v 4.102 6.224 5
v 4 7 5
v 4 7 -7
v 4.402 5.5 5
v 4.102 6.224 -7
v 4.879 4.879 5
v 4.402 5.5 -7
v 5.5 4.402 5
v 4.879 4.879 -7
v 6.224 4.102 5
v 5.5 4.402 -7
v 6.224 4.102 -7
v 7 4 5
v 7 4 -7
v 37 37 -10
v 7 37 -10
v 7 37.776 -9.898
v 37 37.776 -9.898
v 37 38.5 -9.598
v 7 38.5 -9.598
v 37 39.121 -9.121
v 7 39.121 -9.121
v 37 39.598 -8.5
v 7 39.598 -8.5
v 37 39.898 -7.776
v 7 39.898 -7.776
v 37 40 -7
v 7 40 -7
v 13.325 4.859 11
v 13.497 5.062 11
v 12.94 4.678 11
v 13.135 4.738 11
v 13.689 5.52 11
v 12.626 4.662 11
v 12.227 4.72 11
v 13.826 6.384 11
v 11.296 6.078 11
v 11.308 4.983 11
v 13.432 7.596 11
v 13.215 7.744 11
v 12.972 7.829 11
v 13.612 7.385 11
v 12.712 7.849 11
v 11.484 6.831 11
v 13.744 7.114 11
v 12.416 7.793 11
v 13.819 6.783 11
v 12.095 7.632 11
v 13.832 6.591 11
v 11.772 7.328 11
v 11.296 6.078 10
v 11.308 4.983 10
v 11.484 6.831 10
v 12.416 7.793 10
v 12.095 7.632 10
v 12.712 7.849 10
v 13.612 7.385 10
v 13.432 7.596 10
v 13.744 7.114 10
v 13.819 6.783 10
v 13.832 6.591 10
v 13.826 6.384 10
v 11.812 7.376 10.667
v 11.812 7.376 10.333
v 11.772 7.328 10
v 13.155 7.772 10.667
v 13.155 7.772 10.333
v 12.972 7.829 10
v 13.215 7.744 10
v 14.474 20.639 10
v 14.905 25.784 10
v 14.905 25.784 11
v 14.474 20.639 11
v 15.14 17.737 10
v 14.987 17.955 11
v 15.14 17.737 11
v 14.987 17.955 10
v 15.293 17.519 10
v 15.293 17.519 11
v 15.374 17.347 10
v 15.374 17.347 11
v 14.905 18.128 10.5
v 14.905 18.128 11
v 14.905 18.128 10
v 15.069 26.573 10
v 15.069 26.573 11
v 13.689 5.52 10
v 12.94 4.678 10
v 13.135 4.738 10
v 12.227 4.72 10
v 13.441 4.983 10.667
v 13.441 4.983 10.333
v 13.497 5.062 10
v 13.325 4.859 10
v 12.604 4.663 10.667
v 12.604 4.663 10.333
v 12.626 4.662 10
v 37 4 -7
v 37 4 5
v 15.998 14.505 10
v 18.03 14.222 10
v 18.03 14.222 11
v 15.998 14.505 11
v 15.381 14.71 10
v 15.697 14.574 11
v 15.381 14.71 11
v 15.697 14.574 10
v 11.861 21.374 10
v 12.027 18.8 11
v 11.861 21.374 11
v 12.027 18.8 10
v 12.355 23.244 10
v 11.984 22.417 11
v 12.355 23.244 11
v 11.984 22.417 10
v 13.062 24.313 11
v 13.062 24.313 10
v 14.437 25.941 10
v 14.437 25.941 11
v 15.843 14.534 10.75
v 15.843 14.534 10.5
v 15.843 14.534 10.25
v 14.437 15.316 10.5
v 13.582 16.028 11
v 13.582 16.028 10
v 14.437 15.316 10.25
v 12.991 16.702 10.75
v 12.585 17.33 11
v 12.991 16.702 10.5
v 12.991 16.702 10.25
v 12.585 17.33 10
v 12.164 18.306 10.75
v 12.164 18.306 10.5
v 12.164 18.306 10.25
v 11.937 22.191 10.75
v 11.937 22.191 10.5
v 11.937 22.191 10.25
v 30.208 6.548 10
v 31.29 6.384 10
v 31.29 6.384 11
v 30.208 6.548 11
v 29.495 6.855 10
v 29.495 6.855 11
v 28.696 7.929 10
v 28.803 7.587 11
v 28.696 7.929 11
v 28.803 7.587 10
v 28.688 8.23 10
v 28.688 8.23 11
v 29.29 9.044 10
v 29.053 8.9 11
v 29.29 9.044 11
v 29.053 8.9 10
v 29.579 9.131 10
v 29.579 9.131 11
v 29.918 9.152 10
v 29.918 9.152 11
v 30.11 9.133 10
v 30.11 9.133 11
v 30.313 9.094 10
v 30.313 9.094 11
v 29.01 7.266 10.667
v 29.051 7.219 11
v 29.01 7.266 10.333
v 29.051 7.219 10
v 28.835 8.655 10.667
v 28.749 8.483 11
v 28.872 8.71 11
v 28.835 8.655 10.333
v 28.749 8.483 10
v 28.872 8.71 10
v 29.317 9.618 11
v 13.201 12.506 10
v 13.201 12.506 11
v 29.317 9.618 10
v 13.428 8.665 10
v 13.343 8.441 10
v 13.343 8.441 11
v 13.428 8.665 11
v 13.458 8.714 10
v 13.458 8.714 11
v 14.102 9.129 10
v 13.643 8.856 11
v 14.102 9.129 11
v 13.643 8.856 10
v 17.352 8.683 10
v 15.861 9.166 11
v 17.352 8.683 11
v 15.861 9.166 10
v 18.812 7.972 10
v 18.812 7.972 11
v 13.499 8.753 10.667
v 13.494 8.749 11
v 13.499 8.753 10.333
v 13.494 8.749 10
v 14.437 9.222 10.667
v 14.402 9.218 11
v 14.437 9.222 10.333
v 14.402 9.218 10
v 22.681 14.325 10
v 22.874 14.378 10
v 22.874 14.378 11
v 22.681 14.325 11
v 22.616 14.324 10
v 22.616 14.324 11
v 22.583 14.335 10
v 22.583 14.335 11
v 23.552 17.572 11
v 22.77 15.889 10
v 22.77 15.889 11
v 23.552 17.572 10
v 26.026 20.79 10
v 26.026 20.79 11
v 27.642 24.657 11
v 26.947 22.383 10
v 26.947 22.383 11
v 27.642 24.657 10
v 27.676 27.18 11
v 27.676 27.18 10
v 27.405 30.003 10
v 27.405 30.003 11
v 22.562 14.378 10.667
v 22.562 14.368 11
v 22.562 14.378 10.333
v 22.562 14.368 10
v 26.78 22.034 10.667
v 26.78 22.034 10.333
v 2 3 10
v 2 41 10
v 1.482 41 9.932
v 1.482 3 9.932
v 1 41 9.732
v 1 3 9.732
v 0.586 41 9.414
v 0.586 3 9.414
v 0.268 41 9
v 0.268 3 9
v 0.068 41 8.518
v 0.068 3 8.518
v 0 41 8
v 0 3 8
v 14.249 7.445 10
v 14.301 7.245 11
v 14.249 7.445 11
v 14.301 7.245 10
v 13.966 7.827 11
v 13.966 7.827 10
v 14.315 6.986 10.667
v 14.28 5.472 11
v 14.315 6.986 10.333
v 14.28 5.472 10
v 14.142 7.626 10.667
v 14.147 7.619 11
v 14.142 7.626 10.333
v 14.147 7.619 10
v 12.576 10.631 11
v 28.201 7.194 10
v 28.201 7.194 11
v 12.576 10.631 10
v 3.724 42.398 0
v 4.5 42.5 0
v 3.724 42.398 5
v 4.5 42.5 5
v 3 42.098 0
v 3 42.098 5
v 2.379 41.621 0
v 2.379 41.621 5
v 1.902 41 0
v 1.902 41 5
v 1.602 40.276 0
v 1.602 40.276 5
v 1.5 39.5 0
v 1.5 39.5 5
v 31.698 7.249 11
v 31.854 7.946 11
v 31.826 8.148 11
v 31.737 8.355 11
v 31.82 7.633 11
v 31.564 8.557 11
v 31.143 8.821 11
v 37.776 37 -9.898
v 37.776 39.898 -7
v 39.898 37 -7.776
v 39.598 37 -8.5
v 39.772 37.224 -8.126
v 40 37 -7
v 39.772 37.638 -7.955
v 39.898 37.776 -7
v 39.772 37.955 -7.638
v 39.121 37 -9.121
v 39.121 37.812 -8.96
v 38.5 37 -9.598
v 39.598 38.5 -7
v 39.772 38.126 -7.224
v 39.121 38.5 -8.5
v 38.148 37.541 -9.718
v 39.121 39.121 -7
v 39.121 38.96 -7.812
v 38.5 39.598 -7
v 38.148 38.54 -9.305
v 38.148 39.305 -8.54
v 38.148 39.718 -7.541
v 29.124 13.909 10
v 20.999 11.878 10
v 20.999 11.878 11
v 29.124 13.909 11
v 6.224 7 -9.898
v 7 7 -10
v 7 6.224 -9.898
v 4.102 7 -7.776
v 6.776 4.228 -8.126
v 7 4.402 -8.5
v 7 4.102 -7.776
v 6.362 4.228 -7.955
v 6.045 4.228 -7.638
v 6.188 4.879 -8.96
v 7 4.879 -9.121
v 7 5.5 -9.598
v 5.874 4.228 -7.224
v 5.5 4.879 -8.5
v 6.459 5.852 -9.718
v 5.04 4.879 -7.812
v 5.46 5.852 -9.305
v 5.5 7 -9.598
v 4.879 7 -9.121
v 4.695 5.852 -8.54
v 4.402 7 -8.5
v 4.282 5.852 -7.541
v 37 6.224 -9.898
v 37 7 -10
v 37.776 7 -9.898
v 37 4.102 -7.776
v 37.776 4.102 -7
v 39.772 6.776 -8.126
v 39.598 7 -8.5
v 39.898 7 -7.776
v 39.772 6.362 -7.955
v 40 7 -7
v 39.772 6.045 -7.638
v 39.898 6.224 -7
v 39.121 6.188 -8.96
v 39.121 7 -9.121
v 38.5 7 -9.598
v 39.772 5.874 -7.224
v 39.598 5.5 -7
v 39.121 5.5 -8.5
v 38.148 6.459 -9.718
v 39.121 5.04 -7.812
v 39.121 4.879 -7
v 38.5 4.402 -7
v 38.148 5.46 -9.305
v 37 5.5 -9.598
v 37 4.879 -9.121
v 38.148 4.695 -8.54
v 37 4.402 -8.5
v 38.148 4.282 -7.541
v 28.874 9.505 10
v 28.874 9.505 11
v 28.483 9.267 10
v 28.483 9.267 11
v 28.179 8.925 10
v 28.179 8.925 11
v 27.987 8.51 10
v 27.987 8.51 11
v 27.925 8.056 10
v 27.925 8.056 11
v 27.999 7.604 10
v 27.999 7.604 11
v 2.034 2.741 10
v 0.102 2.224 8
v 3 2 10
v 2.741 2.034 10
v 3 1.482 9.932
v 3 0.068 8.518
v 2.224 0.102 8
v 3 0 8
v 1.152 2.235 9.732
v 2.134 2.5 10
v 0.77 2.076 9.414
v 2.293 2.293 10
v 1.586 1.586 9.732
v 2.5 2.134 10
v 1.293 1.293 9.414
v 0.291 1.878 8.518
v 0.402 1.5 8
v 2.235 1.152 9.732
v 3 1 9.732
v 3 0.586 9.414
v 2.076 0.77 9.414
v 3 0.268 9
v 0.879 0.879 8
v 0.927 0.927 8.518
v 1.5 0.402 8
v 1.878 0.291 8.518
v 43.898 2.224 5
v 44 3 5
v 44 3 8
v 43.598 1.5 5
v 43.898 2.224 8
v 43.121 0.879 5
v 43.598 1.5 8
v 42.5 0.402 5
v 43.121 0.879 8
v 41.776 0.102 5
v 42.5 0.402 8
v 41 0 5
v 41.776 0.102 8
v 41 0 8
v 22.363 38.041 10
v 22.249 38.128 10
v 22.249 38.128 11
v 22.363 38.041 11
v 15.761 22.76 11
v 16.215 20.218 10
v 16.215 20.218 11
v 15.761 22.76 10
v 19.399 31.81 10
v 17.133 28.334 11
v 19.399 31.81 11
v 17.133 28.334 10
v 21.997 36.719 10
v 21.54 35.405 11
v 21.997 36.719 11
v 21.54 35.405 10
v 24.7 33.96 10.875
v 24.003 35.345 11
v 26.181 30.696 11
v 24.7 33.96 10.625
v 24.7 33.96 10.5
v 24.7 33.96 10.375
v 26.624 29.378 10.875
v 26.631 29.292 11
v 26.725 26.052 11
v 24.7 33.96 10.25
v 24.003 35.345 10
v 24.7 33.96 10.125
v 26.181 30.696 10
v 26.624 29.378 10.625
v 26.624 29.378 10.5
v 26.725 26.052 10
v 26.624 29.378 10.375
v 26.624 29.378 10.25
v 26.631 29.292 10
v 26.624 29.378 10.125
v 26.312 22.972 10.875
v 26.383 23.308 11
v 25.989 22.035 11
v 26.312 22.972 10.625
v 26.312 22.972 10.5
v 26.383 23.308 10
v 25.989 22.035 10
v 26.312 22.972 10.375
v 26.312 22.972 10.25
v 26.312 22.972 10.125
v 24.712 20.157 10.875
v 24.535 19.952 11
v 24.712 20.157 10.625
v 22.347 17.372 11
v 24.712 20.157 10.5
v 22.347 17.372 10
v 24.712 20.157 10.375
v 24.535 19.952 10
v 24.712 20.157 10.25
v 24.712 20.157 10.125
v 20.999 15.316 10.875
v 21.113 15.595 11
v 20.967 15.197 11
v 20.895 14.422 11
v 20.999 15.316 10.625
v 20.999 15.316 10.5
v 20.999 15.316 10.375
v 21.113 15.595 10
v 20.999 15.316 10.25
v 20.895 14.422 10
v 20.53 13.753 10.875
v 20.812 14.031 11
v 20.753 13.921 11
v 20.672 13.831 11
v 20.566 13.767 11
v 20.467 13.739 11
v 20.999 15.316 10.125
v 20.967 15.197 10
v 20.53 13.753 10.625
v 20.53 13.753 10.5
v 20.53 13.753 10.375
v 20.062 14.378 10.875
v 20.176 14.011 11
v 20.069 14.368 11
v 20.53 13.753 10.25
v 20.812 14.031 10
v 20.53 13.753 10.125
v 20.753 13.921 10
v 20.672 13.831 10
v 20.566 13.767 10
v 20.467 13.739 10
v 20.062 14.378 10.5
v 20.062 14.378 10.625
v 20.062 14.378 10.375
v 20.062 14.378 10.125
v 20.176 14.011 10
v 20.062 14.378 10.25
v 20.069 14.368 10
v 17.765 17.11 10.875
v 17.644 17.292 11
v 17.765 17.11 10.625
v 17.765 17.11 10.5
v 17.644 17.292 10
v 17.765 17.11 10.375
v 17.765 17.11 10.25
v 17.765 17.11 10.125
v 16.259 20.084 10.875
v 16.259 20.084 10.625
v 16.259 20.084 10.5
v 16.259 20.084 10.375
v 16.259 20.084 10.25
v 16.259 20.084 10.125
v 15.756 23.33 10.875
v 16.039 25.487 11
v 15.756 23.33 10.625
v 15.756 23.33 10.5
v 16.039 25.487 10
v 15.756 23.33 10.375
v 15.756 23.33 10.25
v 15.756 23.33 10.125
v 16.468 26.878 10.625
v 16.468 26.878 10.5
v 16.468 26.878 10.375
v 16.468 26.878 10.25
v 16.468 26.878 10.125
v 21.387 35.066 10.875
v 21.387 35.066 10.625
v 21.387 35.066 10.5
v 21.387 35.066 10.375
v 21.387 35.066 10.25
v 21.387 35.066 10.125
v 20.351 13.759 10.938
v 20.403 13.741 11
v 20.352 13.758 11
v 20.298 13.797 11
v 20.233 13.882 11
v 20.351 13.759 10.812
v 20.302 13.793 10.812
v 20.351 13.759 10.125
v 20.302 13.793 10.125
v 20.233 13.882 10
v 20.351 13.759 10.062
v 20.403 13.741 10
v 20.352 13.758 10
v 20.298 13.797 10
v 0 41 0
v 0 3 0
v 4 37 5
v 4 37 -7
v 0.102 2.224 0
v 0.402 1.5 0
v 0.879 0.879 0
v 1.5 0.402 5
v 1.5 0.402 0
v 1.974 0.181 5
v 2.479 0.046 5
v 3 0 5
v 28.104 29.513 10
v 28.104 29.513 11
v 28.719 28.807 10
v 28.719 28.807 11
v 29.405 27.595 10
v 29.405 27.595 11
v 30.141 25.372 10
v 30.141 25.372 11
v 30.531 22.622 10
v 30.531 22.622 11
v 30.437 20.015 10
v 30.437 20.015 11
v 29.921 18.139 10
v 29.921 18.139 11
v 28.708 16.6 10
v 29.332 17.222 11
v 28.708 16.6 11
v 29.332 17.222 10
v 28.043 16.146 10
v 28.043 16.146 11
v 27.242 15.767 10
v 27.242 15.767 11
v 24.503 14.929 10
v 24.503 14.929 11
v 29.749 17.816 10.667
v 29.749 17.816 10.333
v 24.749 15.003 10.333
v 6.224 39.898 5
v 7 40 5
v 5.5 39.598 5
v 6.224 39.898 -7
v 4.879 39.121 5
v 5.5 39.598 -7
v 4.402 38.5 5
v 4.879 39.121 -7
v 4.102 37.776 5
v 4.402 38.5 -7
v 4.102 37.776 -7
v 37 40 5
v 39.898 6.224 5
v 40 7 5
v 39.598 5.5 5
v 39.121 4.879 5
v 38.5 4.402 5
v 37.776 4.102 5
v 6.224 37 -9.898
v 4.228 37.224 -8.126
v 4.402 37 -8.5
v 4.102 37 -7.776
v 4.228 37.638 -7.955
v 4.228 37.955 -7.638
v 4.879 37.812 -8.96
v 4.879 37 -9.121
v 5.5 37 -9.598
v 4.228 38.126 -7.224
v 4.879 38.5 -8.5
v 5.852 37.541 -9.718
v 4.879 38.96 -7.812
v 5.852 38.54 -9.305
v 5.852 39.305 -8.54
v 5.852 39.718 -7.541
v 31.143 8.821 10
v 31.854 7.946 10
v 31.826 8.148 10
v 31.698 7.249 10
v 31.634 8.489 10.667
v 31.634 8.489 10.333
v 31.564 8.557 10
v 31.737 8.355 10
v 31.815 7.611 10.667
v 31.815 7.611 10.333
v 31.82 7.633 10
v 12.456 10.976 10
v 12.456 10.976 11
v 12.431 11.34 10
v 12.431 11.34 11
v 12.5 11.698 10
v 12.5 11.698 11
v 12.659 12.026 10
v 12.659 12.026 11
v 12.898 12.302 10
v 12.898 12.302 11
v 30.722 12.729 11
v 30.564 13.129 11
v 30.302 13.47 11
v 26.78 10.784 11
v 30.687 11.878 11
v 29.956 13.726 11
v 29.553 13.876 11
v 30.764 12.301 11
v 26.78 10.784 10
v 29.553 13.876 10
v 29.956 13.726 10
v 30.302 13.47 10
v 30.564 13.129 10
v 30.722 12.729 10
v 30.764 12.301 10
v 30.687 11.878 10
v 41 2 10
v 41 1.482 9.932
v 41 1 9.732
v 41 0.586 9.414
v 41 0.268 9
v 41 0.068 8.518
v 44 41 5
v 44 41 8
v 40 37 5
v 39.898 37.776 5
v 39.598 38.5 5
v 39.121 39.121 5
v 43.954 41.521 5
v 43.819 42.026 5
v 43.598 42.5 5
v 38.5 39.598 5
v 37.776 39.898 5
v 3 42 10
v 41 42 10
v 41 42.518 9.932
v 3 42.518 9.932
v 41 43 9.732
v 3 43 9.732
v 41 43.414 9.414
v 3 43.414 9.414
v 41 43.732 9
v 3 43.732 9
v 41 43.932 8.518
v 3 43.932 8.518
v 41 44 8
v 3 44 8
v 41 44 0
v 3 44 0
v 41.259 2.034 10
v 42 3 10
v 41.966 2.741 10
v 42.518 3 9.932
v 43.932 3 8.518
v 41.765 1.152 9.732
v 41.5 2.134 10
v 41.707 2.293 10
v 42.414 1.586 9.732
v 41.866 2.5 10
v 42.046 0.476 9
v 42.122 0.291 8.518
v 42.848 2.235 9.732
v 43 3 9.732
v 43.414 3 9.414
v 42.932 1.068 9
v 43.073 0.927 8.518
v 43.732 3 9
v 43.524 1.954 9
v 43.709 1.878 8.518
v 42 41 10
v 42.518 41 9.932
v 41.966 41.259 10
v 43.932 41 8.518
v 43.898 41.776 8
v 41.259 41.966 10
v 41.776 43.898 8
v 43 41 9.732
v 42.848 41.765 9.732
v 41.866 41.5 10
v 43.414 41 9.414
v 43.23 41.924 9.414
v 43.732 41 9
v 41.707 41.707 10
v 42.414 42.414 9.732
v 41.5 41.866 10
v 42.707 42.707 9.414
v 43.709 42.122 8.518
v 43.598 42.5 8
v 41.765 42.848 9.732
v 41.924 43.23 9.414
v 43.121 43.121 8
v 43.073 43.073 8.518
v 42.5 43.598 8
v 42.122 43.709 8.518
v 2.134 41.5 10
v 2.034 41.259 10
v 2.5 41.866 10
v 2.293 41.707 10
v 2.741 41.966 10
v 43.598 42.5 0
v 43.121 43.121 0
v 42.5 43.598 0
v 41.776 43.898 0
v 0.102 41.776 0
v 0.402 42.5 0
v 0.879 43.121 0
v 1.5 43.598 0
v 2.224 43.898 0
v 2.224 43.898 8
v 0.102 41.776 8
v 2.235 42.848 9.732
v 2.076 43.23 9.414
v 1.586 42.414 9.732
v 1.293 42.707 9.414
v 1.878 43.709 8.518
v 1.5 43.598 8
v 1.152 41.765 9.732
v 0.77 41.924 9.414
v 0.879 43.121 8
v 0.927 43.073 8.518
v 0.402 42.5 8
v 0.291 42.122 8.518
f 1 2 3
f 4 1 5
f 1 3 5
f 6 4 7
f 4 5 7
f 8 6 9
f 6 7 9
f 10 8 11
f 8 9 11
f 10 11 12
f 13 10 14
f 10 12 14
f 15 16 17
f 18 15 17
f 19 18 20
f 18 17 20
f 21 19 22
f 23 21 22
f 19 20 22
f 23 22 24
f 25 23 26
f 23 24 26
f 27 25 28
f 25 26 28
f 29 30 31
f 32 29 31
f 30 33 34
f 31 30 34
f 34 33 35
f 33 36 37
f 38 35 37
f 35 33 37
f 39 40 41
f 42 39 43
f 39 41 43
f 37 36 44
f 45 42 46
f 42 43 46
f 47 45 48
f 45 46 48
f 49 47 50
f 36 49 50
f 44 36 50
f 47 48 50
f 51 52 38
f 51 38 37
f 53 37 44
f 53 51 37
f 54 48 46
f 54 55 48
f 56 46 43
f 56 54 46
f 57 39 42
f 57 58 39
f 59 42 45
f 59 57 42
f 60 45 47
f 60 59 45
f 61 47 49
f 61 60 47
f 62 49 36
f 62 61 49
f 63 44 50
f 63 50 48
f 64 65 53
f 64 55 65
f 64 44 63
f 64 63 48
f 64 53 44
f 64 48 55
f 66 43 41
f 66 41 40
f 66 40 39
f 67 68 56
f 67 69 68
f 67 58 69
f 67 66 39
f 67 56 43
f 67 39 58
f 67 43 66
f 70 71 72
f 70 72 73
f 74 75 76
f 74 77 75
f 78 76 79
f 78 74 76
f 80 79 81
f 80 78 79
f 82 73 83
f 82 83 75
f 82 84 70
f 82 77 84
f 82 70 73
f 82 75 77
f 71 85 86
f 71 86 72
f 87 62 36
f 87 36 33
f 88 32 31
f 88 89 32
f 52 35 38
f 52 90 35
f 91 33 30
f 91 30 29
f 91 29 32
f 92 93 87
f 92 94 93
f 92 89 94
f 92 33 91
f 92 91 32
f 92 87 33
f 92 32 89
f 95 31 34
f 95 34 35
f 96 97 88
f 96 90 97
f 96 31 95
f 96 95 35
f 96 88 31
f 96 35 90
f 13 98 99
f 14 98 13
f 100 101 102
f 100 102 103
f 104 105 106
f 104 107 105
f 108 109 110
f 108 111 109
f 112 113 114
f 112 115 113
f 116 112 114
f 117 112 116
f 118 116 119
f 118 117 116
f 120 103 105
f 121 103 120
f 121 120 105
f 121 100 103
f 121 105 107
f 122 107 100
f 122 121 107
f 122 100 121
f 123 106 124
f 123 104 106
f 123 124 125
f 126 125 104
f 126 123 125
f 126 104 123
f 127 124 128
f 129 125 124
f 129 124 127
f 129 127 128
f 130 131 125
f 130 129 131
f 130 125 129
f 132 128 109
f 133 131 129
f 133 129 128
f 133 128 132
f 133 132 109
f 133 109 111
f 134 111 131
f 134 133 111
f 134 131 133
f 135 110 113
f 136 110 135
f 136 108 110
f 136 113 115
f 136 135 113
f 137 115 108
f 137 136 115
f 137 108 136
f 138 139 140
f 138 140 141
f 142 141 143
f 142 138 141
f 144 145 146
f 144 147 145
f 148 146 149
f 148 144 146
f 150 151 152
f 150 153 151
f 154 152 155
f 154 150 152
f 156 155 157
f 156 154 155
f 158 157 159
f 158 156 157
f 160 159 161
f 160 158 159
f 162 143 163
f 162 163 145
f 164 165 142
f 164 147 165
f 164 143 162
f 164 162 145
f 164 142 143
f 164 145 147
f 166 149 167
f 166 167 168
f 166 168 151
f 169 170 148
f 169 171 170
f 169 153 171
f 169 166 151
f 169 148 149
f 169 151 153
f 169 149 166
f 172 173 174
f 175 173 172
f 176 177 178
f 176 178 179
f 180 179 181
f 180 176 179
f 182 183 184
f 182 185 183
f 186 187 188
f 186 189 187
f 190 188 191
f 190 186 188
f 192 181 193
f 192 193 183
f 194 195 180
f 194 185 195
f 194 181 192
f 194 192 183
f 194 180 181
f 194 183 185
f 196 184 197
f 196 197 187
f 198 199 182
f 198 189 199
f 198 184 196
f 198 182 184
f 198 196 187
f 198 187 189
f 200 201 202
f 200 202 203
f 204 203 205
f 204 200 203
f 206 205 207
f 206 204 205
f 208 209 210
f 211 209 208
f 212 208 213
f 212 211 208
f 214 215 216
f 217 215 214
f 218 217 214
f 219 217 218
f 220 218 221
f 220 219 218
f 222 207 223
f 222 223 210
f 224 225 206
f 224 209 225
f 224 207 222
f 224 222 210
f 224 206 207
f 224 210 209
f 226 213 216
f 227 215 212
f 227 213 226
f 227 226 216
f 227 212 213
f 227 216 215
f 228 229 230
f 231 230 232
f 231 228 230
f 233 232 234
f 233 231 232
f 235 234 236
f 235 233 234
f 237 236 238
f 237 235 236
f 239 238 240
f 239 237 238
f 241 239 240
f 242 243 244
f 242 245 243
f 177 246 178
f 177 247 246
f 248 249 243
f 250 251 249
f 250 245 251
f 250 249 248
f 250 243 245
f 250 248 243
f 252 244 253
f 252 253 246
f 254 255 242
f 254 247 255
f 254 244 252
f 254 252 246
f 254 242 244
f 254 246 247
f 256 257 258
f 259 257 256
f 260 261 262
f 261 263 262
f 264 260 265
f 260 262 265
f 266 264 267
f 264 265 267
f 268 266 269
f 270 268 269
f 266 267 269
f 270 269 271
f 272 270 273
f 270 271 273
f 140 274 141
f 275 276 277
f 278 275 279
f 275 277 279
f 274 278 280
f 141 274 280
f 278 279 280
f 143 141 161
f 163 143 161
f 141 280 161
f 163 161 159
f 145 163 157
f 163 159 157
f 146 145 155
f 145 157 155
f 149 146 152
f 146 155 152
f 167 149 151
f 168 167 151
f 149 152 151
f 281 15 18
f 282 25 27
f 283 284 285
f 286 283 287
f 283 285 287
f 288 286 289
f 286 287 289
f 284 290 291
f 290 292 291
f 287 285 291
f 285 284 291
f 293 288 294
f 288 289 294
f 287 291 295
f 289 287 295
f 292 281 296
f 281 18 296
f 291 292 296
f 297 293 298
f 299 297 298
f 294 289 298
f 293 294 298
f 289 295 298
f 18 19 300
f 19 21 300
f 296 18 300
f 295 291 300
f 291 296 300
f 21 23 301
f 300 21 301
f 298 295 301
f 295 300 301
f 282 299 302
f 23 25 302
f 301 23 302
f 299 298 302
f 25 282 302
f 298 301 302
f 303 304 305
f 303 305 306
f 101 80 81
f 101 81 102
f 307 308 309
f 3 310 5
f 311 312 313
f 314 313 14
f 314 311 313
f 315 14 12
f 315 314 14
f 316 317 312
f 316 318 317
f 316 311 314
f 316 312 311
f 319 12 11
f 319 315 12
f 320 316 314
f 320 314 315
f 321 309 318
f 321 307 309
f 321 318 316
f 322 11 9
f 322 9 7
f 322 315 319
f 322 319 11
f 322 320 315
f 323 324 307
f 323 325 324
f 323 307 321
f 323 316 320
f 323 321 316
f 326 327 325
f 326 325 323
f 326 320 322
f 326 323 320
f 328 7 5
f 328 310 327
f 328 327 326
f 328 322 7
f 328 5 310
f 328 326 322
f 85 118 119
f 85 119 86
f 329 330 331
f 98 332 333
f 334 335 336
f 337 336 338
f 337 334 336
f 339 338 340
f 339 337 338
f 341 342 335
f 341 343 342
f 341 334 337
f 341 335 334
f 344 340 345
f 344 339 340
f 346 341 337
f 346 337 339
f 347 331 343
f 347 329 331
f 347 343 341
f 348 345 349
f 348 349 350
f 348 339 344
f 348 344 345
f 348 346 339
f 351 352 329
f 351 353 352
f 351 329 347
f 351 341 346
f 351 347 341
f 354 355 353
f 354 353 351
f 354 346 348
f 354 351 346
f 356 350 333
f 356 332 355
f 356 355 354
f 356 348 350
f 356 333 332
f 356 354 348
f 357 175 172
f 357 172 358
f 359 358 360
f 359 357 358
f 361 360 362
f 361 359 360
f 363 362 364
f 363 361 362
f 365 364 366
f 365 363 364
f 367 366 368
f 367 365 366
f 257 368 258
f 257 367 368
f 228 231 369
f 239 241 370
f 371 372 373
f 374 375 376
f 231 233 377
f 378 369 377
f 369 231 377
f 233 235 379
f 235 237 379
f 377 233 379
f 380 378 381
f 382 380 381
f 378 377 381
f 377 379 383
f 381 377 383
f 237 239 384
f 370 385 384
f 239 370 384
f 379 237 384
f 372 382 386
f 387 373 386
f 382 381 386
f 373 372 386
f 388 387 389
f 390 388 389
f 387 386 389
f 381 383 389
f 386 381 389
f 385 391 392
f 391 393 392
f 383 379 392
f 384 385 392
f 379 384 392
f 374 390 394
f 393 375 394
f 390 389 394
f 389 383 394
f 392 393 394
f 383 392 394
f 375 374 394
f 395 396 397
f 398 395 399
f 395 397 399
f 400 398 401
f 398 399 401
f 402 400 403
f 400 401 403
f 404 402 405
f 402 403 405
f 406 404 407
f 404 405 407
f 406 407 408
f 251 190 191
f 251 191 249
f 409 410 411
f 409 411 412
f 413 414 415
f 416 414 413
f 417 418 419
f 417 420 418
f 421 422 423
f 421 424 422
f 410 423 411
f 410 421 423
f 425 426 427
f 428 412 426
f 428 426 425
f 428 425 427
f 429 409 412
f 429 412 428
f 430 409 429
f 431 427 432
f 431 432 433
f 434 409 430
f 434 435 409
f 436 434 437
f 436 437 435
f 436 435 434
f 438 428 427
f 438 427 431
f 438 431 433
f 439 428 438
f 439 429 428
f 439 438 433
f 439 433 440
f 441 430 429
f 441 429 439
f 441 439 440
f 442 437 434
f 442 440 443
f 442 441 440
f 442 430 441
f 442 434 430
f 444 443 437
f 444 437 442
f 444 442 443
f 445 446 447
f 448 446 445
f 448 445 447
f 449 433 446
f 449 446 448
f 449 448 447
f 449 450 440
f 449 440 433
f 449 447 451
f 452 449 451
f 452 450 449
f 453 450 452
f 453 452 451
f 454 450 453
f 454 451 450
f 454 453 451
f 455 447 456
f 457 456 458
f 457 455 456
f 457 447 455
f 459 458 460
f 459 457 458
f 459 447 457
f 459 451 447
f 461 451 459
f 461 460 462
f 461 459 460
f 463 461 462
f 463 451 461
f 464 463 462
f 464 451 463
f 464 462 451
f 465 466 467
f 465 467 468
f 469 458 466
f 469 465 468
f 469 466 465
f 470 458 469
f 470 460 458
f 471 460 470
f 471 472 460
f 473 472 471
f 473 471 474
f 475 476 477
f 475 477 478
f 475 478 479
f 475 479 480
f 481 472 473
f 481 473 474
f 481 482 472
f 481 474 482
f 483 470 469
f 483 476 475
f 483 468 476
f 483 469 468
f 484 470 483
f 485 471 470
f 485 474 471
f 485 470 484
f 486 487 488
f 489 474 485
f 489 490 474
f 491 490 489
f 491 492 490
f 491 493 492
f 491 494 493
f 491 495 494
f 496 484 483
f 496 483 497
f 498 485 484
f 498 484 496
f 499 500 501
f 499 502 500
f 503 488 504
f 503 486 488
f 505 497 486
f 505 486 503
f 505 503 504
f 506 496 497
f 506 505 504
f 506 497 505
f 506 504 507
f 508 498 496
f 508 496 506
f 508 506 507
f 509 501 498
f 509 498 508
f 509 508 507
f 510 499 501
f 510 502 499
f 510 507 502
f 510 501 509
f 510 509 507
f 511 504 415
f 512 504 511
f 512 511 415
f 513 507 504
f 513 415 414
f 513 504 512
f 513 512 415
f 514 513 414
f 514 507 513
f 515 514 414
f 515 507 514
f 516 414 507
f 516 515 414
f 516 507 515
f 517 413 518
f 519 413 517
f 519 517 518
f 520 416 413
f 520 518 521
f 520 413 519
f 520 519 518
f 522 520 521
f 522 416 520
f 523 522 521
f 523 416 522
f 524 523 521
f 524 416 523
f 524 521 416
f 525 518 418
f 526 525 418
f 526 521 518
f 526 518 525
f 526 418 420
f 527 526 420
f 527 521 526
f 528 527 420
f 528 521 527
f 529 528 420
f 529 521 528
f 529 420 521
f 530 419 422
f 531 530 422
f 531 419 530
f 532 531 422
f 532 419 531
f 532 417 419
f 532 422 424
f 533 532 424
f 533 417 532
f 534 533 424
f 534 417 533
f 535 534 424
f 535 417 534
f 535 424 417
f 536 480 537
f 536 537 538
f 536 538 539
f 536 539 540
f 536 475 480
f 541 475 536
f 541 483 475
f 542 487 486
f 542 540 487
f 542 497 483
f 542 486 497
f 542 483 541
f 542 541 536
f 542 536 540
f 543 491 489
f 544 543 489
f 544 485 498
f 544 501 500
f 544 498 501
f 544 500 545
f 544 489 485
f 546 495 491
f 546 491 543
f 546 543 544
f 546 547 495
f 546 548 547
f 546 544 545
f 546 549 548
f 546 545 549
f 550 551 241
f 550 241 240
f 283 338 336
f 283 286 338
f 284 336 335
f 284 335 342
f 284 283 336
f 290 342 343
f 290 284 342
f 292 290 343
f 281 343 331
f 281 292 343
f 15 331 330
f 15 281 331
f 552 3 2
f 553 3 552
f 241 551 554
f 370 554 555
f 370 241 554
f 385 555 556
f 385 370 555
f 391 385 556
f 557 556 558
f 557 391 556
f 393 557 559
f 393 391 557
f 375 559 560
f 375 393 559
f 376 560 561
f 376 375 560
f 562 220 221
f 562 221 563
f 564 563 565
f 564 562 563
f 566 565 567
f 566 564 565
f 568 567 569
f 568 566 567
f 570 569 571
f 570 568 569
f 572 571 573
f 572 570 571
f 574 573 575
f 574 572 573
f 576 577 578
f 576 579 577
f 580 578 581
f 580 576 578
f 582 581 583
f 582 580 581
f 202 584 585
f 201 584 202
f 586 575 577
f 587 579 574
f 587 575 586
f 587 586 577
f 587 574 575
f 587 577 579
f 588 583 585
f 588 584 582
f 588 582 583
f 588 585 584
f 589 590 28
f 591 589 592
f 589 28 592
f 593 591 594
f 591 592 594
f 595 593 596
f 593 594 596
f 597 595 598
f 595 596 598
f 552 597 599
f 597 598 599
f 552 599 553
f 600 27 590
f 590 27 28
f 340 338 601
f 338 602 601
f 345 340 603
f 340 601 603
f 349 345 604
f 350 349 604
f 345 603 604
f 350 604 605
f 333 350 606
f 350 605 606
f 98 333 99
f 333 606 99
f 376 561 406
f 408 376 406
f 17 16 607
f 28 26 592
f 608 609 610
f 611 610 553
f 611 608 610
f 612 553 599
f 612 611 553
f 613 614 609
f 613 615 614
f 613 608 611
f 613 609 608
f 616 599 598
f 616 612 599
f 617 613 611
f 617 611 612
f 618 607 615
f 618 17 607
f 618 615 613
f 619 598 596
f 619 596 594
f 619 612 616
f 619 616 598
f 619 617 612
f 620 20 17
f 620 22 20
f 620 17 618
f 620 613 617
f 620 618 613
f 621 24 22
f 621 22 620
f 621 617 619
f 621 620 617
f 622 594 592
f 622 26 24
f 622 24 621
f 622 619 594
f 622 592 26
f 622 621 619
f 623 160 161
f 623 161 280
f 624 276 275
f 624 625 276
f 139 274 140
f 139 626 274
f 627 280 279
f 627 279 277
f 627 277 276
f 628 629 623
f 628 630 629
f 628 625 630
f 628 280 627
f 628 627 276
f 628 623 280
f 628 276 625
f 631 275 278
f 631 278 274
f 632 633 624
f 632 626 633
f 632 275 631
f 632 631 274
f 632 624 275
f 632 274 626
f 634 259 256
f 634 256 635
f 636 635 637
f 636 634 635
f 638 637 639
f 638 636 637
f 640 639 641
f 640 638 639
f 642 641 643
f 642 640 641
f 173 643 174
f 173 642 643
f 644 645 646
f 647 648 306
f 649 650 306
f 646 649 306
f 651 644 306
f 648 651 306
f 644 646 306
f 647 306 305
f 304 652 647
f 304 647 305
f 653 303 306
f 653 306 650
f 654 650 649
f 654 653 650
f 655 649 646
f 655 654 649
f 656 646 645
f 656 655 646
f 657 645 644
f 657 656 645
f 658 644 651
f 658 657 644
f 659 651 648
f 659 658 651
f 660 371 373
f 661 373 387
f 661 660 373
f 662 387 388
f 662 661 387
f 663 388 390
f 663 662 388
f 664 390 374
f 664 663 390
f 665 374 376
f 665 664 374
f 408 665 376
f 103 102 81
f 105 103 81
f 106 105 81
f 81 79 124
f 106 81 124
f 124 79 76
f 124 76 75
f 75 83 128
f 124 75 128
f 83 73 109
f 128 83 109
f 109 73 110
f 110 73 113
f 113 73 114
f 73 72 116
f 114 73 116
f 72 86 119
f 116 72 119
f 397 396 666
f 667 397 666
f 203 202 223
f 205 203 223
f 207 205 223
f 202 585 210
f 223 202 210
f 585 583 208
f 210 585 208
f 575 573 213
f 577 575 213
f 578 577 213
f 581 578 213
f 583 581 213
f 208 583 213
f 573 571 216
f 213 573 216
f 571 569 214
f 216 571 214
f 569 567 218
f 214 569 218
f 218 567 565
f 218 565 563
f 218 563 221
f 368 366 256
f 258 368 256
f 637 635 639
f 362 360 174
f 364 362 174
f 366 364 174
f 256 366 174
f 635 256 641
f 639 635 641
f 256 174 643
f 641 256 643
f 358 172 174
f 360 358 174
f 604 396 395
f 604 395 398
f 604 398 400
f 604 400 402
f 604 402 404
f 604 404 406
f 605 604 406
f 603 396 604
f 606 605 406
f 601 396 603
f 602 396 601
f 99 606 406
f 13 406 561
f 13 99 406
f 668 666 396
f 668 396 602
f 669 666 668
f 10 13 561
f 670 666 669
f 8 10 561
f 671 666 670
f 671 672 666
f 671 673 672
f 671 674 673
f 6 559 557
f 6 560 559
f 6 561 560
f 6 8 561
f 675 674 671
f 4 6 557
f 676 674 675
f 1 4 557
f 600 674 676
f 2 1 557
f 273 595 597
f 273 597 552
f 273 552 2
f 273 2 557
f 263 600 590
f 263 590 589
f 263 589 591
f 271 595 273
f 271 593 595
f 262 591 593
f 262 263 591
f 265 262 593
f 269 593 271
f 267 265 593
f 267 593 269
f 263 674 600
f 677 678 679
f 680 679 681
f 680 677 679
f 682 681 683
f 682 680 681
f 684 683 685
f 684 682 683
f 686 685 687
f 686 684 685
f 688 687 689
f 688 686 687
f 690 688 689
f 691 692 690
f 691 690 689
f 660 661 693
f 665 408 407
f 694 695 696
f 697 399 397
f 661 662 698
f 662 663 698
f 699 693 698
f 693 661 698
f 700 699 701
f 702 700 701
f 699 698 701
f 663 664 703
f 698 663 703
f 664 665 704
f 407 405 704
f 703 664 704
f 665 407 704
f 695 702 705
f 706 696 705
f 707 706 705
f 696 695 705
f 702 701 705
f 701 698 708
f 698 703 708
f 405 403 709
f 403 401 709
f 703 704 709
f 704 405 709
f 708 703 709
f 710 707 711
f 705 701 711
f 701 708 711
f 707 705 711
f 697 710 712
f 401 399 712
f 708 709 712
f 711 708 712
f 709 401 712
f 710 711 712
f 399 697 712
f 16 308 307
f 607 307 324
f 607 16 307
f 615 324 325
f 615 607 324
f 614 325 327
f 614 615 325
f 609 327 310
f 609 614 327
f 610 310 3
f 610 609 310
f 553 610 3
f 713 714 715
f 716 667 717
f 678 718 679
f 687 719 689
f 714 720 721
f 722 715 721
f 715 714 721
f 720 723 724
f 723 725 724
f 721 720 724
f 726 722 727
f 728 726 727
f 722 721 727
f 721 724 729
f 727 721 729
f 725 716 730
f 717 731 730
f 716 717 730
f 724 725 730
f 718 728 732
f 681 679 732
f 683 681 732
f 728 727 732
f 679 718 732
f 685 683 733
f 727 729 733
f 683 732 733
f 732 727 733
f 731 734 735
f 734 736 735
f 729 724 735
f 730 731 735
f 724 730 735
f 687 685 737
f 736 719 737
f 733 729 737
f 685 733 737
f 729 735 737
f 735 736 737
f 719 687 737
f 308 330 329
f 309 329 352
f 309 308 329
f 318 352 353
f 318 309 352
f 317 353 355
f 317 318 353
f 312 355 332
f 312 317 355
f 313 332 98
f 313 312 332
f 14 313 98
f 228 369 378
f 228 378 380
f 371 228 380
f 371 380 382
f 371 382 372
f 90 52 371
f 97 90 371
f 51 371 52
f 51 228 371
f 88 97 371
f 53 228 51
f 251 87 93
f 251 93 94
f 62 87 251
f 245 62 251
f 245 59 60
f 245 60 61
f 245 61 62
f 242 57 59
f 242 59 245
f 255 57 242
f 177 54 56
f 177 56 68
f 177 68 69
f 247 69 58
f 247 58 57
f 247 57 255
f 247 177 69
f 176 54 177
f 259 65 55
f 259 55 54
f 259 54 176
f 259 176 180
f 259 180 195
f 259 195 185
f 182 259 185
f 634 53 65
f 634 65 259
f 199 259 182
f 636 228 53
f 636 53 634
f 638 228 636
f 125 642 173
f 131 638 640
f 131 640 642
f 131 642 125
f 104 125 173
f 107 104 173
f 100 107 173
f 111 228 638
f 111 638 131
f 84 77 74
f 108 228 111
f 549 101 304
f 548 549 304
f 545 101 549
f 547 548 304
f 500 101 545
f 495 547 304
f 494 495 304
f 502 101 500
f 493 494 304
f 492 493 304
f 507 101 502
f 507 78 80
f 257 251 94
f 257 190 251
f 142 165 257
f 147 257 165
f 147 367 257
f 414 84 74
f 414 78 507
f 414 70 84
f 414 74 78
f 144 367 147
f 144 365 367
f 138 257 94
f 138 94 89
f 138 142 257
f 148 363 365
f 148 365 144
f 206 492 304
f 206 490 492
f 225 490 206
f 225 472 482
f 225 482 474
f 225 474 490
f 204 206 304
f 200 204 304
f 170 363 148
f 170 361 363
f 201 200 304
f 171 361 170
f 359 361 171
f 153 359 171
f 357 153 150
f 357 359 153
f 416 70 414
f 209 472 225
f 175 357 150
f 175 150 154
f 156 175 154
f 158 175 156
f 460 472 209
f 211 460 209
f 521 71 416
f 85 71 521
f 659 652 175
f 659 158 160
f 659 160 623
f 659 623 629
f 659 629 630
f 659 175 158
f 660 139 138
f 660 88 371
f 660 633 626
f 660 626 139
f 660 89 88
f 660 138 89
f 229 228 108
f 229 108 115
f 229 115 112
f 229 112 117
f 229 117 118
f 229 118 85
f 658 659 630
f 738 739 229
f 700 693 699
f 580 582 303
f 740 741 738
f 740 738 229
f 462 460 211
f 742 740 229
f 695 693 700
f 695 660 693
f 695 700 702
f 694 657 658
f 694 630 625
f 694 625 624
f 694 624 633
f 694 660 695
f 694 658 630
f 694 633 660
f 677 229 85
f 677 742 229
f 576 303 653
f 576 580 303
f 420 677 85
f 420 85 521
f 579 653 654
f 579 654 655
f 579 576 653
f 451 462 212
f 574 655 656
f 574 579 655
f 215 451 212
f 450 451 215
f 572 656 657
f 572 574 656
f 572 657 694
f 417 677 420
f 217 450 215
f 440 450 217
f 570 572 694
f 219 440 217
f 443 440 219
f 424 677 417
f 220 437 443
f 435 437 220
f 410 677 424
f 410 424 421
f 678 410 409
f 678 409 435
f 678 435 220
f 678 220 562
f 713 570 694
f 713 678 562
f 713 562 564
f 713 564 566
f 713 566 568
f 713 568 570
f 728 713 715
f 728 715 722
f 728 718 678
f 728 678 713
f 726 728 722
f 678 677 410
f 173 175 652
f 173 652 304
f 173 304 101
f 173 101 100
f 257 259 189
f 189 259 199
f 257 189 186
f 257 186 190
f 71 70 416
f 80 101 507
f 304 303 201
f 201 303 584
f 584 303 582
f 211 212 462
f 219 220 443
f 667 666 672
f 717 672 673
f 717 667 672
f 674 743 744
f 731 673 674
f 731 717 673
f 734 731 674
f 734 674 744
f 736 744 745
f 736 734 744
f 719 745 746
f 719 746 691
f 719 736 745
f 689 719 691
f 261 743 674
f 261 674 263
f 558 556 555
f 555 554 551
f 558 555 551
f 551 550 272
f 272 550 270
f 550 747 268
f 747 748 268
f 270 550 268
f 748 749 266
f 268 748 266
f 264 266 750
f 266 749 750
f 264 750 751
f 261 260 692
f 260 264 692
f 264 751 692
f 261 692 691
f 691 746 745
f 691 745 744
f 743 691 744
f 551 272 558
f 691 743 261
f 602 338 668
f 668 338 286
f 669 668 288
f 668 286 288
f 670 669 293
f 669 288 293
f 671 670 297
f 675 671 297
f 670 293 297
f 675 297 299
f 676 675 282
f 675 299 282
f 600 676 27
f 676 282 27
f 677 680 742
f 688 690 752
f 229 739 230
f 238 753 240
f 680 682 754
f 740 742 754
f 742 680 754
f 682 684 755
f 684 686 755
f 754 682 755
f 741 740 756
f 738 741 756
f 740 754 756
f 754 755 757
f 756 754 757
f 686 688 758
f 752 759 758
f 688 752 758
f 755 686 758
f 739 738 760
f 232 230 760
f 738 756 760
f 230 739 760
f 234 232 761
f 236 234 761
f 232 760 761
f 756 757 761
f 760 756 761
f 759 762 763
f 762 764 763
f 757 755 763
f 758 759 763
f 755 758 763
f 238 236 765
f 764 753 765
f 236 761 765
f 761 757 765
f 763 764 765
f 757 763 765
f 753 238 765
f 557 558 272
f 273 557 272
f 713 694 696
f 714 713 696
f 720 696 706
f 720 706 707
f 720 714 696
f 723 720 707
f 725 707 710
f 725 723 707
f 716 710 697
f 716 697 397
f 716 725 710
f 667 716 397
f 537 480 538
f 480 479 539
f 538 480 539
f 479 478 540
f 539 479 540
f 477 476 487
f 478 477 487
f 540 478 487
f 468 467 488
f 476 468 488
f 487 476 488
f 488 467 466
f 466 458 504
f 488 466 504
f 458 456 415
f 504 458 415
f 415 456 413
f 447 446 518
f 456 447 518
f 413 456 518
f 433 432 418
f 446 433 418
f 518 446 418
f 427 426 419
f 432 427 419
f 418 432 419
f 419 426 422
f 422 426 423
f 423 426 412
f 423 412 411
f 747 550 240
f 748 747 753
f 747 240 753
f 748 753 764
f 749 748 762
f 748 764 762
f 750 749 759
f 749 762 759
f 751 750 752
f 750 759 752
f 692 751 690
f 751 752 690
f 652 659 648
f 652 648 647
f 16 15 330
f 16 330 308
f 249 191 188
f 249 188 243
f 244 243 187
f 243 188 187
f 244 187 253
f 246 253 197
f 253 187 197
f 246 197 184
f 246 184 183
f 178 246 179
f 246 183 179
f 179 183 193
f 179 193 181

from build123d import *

# Parameters (mm, degrees)
ESQUISSE2_W             = 44
ESQUISSE2_H             = 44
BOSS_EXTRU_1_DEPTH      = 10
ESQUISSE3_W             = 36
ESQUISSE3_H             = 36
BOSS_EXTRU_2_DEPTH      = 10
ESQUISSE4_W             = 42.5
ESQUISSE4_H             = 42.5
ESQUISSE4_W_2           = 36
ESQUISSE4_H_2           = 36
ENL_V_MAT_EXTRU_1_DEPTH = 5
CONG_1_R                = 3
CONG_2_R                = 2
BOSS_EXTRU_4_DEPTH      = 1


with BuildPart() as part:
    # Esquisse2 → Boss.-Extru.1 (new body)
    with BuildSketch(Plane.XY):
        with Locations((22, 22)):
            Rectangle(ESQUISSE2_W, ESQUISSE2_H)
    extrude(amount=BOSS_EXTRU_1_DEPTH)

    # Esquisse3 → Boss.-Extru.2 (add)
    with BuildSketch(Plane(origin=(0, 0, 0), x_dir=(-1, 0, 0), z_dir=(0, 0, -1))):
        with Locations((-22, 22)):
            Rectangle(ESQUISSE3_W, ESQUISSE3_H)
    extrude(amount=BOSS_EXTRU_2_DEPTH)

    # Esquisse4 → Enlèv. mat.-Extru.1 (cut)
    with BuildSketch(Plane(origin=(0, 0, 0), x_dir=(-1, 0, 0), z_dir=(0, 0, -1))):
        with Locations((-22.75, 21.25)):
            Rectangle(ESQUISSE4_W, ESQUISSE4_H)
        with Locations((-22, 22)):
            Rectangle(ESQUISSE4_W_2, ESQUISSE4_H_2, mode=Mode.SUBTRACT)
    extrude(amount=-ENL_V_MAT_EXTRU_1_DEPTH, mode=Mode.SUBTRACT)

    # Congé1
    cong_1_edges = [part.edges().sort_by_distance(p)[0] for p in [
        (22, 40, -10),
        (4, 22, -10),
        (22, 4, -10),
        (40, 22, -10),
        (44, 0, 7.5),
        (44, 44, 5),
        (0, 0, 5),
        (0, 44, 5),
        (1.5, 42.5, 2.5),
        (4, 4, -2.5),
        (4, 40, -2.5),
        (40, 4, -2.5),
        (40, 40, -2.5),
    ]]
    fillet(cong_1_edges, radius=CONG_1_R)

    # Congé2
    cong_2_edges = [part.edges().sort_by_distance(p)[0] for p in [
        (44, 22, 10),
        (22, 0, 10),
        (0, 22, 10),
        (22, 44, 10),
        (0.878679656, 43.121320344, 10),
        (0.878679656, 0.878679656, 10),
        (43.121320344, 43.121320344, 10),
        (43.121320344, 0.878679656, 10),
    ]]
    fillet(cong_2_edges, radius=CONG_2_R)

    # Esquisse7 → Boss.-Extru.4 (add)
    with BuildSketch(Plane.XY.offset(10)):
        with BuildLine():
            Line((15.374098957, 17.346843443), (18.030348957, 14.221843443))
            add(Edge.make_bspline(
                [(18.030348957, 14.221843443), (17.301182291, 14.32601011), (16.565114838, 14.389890267), (15.842848957, 14.534343443), (15.423010802, 14.618311074), (14.838115665, 15.028795794), (14.436598957, 15.315593443), (12.049681404, 17.020534553), (11.595795075, 19.293760446), (11.936598957, 22.190593443), (12.054157826, 23.189843826), (13.69238751, 25.196381996), (14.436598957, 25.940593443)],
                knots=[0, 0, 0, 0, 1, 1, 1, 2, 2, 2, 3, 3, 3, 4, 4, 4, 4], degree=3))
            Line((14.436598957, 25.940593443), (15.06939707, 26.573391556))
            Line((15.06939707, 26.573391556), (14.905348957, 25.784343443))
            add(Edge.make_bspline(
                [(14.905348957, 25.784343443), (14.590446041, 23.265120116), (14.091309116, 20.570212966), (14.905348957, 18.128093443), (15.001385879, 17.839982679), (15.278062036, 17.634954207), (15.374098957, 17.346843443)],
                knots=[0, 0, 0, 0, 1, 1, 1, 2, 2, 2, 2], degree=3))
        make_face()
        with BuildLine():
            Line((30.686598957, 11.878093443), (26.780348957, 10.784343443))
            Line((26.780348957, 10.784343443), (20.999098957, 11.878093443))
            Line((20.999098957, 11.878093443), (29.124098957, 13.909343443))
            ThreePointArc((29.124098957, 13.909343443), (30.444920086, 13.308773157), (30.686598957, 11.878093443))
        make_face()
        with BuildLine():
            Line((18.811598957, 7.971843443), (14.280348957, 5.471843443))
            add(Edge.make_bspline(
                [(14.280348957, 5.471843443), (14.280348957, 7.772797666), (14.593726557, 7.189715843), (13.342848957, 8.440593443)],
                knots=[0, 0, 0, 0, 1, 1, 1, 1], degree=3))
            add(Edge.make_bspline(
                [(13.342848957, 8.440593443), (13.394932291, 8.54476011), (13.404330032, 8.685401354), (13.499098957, 8.753093443), (13.783405732, 8.956169711), (14.089133052, 9.185268084), (14.436598957, 9.221843443), (16.134694919, 9.400590386), (17.384797269, 8.685244287), (18.811598957, 7.971843443)],
                knots=[0, 0, 0, 0, 1, 1, 1, 2, 2, 2, 3, 3, 3, 3], degree=3))
        make_face()
        with BuildLine():
            Line((13.200641117, 12.506283222), (29.317230938, 9.618393711))
            ThreePointArc((29.317230938, 9.618393711), (28.067553161, 8.724486443), (28.200641117, 7.193783222))
            Line((28.200641117, 7.193783222), (12.575641117, 10.631283222))
            ThreePointArc((12.575641117, 10.631283222), (12.499815902, 11.698224961), (13.200641117, 12.506283222))
        make_face()
        with BuildLine():
            add(Edge.make_bspline(
                [(20.999098957, 15.315593443), (20.827145061, 14.799731755), (21.046210645, 13.925047339), (20.530348957, 13.753093443), (20.153128088, 13.627353153), (20.137873233, 14.301819167), (20.061598957, 14.378093443), (16.567694762, 17.871997638), (14.613515541, 21.933204334), (16.467848957, 26.878093443), (17.971713728, 30.888399498), (21.846423142, 33.698659479), (22.249098957, 38.128093443)],
                knots=[4, 4, 4, 4, 5, 5, 5, 6, 6, 6, 7, 7, 7, 8, 8, 8, 8], degree=3))
            add(Edge.make_bspline(
                [(22.249098957, 38.128093443), (23.024720103, 37.74028287), (26.549972992, 30.317022339), (26.624098957, 29.378093443), (26.824723104, 26.836854256), (26.793735434, 25.141457588), (26.311598957, 22.971843443), (25.843661476, 20.866124777), (23.763276375, 19.341691827), (22.561598957, 17.659343443), (22.093633816, 17.004192245), (21.257183639, 16.089847489), (20.999098957, 15.315593443)],
                knots=[0, 0, 0, 0, 1, 1, 1, 2, 2, 2, 3, 3, 3, 4, 4, 4, 4], degree=3))
        make_face()
        with BuildLine():
            add(Edge.make_bspline(
                [(22.874098957, 14.378093443), (22.776875457, 14.340699789), (22.561598957, 14.273926776), (22.561598957, 14.378093443), (22.561598957, 17.724570677), (25.385181625, 19.244008778), (26.780348957, 22.034343443), (28.269529967, 25.012705463), (27.627114524, 26.898375507), (27.405348957, 30.003093443)],
                knots=[3, 3, 3, 3, 4, 4, 4, 5, 5, 5, 6, 6, 6, 6], degree=3))
            add(Edge.make_bspline(
                [(27.405348957, 30.003093443), (30.439237099, 28.486149372), (31.410808057, 20.585108609), (29.749098957, 17.815593443), (28.578255605, 15.864187855), (26.718288261, 15.58655694), (24.749098957, 15.003093443), (24.117435238, 14.815933822), (23.488994366, 14.614591677), (22.874098957, 14.378093443)],
                knots=[0, 0, 0, 0, 1, 1, 1, 2, 2, 2, 3, 3, 3, 3], degree=3))
        make_face()
        with BuildLine():
            add(Edge.make_bspline(
                [(13.825641117, 6.383595142), (13.664946359, 4.294397314), (12.835062605, 4.491118619), (11.307669526, 4.983380758)],
                knots=[1, 1, 1, 1, 2, 2, 2, 2], degree=3))
            add(Edge.make_bspline(
                [(11.307669526, 4.983380758), (10.888236852, 8.443524348), (13.995704046, 8.594588879), (13.825641117, 6.383595142)],
                knots=[0, 0, 0, 0, 1, 1, 1, 1], degree=3))
        make_face()
        with BuildLine():
            add(Edge.make_bspline(
                [(30.312986898, 9.093826211), (32.34922339, 8.599547626), (32.02172038, 7.812052803), (31.290447284, 6.383595142)],
                knots=[1, 1, 1, 1, 2, 2, 2, 2], degree=3))
            add(Edge.make_bspline(
                [(31.290447284, 6.383595142), (27.807867011, 6.525553152), (28.158042034, 9.616920214), (30.312986898, 9.093826211)],
                knots=[0, 0, 0, 0, 1, 1, 1, 1], degree=3))
        make_face()
    extrude(amount=BOSS_EXTRU_4_DEPTH)


solid = part.part
